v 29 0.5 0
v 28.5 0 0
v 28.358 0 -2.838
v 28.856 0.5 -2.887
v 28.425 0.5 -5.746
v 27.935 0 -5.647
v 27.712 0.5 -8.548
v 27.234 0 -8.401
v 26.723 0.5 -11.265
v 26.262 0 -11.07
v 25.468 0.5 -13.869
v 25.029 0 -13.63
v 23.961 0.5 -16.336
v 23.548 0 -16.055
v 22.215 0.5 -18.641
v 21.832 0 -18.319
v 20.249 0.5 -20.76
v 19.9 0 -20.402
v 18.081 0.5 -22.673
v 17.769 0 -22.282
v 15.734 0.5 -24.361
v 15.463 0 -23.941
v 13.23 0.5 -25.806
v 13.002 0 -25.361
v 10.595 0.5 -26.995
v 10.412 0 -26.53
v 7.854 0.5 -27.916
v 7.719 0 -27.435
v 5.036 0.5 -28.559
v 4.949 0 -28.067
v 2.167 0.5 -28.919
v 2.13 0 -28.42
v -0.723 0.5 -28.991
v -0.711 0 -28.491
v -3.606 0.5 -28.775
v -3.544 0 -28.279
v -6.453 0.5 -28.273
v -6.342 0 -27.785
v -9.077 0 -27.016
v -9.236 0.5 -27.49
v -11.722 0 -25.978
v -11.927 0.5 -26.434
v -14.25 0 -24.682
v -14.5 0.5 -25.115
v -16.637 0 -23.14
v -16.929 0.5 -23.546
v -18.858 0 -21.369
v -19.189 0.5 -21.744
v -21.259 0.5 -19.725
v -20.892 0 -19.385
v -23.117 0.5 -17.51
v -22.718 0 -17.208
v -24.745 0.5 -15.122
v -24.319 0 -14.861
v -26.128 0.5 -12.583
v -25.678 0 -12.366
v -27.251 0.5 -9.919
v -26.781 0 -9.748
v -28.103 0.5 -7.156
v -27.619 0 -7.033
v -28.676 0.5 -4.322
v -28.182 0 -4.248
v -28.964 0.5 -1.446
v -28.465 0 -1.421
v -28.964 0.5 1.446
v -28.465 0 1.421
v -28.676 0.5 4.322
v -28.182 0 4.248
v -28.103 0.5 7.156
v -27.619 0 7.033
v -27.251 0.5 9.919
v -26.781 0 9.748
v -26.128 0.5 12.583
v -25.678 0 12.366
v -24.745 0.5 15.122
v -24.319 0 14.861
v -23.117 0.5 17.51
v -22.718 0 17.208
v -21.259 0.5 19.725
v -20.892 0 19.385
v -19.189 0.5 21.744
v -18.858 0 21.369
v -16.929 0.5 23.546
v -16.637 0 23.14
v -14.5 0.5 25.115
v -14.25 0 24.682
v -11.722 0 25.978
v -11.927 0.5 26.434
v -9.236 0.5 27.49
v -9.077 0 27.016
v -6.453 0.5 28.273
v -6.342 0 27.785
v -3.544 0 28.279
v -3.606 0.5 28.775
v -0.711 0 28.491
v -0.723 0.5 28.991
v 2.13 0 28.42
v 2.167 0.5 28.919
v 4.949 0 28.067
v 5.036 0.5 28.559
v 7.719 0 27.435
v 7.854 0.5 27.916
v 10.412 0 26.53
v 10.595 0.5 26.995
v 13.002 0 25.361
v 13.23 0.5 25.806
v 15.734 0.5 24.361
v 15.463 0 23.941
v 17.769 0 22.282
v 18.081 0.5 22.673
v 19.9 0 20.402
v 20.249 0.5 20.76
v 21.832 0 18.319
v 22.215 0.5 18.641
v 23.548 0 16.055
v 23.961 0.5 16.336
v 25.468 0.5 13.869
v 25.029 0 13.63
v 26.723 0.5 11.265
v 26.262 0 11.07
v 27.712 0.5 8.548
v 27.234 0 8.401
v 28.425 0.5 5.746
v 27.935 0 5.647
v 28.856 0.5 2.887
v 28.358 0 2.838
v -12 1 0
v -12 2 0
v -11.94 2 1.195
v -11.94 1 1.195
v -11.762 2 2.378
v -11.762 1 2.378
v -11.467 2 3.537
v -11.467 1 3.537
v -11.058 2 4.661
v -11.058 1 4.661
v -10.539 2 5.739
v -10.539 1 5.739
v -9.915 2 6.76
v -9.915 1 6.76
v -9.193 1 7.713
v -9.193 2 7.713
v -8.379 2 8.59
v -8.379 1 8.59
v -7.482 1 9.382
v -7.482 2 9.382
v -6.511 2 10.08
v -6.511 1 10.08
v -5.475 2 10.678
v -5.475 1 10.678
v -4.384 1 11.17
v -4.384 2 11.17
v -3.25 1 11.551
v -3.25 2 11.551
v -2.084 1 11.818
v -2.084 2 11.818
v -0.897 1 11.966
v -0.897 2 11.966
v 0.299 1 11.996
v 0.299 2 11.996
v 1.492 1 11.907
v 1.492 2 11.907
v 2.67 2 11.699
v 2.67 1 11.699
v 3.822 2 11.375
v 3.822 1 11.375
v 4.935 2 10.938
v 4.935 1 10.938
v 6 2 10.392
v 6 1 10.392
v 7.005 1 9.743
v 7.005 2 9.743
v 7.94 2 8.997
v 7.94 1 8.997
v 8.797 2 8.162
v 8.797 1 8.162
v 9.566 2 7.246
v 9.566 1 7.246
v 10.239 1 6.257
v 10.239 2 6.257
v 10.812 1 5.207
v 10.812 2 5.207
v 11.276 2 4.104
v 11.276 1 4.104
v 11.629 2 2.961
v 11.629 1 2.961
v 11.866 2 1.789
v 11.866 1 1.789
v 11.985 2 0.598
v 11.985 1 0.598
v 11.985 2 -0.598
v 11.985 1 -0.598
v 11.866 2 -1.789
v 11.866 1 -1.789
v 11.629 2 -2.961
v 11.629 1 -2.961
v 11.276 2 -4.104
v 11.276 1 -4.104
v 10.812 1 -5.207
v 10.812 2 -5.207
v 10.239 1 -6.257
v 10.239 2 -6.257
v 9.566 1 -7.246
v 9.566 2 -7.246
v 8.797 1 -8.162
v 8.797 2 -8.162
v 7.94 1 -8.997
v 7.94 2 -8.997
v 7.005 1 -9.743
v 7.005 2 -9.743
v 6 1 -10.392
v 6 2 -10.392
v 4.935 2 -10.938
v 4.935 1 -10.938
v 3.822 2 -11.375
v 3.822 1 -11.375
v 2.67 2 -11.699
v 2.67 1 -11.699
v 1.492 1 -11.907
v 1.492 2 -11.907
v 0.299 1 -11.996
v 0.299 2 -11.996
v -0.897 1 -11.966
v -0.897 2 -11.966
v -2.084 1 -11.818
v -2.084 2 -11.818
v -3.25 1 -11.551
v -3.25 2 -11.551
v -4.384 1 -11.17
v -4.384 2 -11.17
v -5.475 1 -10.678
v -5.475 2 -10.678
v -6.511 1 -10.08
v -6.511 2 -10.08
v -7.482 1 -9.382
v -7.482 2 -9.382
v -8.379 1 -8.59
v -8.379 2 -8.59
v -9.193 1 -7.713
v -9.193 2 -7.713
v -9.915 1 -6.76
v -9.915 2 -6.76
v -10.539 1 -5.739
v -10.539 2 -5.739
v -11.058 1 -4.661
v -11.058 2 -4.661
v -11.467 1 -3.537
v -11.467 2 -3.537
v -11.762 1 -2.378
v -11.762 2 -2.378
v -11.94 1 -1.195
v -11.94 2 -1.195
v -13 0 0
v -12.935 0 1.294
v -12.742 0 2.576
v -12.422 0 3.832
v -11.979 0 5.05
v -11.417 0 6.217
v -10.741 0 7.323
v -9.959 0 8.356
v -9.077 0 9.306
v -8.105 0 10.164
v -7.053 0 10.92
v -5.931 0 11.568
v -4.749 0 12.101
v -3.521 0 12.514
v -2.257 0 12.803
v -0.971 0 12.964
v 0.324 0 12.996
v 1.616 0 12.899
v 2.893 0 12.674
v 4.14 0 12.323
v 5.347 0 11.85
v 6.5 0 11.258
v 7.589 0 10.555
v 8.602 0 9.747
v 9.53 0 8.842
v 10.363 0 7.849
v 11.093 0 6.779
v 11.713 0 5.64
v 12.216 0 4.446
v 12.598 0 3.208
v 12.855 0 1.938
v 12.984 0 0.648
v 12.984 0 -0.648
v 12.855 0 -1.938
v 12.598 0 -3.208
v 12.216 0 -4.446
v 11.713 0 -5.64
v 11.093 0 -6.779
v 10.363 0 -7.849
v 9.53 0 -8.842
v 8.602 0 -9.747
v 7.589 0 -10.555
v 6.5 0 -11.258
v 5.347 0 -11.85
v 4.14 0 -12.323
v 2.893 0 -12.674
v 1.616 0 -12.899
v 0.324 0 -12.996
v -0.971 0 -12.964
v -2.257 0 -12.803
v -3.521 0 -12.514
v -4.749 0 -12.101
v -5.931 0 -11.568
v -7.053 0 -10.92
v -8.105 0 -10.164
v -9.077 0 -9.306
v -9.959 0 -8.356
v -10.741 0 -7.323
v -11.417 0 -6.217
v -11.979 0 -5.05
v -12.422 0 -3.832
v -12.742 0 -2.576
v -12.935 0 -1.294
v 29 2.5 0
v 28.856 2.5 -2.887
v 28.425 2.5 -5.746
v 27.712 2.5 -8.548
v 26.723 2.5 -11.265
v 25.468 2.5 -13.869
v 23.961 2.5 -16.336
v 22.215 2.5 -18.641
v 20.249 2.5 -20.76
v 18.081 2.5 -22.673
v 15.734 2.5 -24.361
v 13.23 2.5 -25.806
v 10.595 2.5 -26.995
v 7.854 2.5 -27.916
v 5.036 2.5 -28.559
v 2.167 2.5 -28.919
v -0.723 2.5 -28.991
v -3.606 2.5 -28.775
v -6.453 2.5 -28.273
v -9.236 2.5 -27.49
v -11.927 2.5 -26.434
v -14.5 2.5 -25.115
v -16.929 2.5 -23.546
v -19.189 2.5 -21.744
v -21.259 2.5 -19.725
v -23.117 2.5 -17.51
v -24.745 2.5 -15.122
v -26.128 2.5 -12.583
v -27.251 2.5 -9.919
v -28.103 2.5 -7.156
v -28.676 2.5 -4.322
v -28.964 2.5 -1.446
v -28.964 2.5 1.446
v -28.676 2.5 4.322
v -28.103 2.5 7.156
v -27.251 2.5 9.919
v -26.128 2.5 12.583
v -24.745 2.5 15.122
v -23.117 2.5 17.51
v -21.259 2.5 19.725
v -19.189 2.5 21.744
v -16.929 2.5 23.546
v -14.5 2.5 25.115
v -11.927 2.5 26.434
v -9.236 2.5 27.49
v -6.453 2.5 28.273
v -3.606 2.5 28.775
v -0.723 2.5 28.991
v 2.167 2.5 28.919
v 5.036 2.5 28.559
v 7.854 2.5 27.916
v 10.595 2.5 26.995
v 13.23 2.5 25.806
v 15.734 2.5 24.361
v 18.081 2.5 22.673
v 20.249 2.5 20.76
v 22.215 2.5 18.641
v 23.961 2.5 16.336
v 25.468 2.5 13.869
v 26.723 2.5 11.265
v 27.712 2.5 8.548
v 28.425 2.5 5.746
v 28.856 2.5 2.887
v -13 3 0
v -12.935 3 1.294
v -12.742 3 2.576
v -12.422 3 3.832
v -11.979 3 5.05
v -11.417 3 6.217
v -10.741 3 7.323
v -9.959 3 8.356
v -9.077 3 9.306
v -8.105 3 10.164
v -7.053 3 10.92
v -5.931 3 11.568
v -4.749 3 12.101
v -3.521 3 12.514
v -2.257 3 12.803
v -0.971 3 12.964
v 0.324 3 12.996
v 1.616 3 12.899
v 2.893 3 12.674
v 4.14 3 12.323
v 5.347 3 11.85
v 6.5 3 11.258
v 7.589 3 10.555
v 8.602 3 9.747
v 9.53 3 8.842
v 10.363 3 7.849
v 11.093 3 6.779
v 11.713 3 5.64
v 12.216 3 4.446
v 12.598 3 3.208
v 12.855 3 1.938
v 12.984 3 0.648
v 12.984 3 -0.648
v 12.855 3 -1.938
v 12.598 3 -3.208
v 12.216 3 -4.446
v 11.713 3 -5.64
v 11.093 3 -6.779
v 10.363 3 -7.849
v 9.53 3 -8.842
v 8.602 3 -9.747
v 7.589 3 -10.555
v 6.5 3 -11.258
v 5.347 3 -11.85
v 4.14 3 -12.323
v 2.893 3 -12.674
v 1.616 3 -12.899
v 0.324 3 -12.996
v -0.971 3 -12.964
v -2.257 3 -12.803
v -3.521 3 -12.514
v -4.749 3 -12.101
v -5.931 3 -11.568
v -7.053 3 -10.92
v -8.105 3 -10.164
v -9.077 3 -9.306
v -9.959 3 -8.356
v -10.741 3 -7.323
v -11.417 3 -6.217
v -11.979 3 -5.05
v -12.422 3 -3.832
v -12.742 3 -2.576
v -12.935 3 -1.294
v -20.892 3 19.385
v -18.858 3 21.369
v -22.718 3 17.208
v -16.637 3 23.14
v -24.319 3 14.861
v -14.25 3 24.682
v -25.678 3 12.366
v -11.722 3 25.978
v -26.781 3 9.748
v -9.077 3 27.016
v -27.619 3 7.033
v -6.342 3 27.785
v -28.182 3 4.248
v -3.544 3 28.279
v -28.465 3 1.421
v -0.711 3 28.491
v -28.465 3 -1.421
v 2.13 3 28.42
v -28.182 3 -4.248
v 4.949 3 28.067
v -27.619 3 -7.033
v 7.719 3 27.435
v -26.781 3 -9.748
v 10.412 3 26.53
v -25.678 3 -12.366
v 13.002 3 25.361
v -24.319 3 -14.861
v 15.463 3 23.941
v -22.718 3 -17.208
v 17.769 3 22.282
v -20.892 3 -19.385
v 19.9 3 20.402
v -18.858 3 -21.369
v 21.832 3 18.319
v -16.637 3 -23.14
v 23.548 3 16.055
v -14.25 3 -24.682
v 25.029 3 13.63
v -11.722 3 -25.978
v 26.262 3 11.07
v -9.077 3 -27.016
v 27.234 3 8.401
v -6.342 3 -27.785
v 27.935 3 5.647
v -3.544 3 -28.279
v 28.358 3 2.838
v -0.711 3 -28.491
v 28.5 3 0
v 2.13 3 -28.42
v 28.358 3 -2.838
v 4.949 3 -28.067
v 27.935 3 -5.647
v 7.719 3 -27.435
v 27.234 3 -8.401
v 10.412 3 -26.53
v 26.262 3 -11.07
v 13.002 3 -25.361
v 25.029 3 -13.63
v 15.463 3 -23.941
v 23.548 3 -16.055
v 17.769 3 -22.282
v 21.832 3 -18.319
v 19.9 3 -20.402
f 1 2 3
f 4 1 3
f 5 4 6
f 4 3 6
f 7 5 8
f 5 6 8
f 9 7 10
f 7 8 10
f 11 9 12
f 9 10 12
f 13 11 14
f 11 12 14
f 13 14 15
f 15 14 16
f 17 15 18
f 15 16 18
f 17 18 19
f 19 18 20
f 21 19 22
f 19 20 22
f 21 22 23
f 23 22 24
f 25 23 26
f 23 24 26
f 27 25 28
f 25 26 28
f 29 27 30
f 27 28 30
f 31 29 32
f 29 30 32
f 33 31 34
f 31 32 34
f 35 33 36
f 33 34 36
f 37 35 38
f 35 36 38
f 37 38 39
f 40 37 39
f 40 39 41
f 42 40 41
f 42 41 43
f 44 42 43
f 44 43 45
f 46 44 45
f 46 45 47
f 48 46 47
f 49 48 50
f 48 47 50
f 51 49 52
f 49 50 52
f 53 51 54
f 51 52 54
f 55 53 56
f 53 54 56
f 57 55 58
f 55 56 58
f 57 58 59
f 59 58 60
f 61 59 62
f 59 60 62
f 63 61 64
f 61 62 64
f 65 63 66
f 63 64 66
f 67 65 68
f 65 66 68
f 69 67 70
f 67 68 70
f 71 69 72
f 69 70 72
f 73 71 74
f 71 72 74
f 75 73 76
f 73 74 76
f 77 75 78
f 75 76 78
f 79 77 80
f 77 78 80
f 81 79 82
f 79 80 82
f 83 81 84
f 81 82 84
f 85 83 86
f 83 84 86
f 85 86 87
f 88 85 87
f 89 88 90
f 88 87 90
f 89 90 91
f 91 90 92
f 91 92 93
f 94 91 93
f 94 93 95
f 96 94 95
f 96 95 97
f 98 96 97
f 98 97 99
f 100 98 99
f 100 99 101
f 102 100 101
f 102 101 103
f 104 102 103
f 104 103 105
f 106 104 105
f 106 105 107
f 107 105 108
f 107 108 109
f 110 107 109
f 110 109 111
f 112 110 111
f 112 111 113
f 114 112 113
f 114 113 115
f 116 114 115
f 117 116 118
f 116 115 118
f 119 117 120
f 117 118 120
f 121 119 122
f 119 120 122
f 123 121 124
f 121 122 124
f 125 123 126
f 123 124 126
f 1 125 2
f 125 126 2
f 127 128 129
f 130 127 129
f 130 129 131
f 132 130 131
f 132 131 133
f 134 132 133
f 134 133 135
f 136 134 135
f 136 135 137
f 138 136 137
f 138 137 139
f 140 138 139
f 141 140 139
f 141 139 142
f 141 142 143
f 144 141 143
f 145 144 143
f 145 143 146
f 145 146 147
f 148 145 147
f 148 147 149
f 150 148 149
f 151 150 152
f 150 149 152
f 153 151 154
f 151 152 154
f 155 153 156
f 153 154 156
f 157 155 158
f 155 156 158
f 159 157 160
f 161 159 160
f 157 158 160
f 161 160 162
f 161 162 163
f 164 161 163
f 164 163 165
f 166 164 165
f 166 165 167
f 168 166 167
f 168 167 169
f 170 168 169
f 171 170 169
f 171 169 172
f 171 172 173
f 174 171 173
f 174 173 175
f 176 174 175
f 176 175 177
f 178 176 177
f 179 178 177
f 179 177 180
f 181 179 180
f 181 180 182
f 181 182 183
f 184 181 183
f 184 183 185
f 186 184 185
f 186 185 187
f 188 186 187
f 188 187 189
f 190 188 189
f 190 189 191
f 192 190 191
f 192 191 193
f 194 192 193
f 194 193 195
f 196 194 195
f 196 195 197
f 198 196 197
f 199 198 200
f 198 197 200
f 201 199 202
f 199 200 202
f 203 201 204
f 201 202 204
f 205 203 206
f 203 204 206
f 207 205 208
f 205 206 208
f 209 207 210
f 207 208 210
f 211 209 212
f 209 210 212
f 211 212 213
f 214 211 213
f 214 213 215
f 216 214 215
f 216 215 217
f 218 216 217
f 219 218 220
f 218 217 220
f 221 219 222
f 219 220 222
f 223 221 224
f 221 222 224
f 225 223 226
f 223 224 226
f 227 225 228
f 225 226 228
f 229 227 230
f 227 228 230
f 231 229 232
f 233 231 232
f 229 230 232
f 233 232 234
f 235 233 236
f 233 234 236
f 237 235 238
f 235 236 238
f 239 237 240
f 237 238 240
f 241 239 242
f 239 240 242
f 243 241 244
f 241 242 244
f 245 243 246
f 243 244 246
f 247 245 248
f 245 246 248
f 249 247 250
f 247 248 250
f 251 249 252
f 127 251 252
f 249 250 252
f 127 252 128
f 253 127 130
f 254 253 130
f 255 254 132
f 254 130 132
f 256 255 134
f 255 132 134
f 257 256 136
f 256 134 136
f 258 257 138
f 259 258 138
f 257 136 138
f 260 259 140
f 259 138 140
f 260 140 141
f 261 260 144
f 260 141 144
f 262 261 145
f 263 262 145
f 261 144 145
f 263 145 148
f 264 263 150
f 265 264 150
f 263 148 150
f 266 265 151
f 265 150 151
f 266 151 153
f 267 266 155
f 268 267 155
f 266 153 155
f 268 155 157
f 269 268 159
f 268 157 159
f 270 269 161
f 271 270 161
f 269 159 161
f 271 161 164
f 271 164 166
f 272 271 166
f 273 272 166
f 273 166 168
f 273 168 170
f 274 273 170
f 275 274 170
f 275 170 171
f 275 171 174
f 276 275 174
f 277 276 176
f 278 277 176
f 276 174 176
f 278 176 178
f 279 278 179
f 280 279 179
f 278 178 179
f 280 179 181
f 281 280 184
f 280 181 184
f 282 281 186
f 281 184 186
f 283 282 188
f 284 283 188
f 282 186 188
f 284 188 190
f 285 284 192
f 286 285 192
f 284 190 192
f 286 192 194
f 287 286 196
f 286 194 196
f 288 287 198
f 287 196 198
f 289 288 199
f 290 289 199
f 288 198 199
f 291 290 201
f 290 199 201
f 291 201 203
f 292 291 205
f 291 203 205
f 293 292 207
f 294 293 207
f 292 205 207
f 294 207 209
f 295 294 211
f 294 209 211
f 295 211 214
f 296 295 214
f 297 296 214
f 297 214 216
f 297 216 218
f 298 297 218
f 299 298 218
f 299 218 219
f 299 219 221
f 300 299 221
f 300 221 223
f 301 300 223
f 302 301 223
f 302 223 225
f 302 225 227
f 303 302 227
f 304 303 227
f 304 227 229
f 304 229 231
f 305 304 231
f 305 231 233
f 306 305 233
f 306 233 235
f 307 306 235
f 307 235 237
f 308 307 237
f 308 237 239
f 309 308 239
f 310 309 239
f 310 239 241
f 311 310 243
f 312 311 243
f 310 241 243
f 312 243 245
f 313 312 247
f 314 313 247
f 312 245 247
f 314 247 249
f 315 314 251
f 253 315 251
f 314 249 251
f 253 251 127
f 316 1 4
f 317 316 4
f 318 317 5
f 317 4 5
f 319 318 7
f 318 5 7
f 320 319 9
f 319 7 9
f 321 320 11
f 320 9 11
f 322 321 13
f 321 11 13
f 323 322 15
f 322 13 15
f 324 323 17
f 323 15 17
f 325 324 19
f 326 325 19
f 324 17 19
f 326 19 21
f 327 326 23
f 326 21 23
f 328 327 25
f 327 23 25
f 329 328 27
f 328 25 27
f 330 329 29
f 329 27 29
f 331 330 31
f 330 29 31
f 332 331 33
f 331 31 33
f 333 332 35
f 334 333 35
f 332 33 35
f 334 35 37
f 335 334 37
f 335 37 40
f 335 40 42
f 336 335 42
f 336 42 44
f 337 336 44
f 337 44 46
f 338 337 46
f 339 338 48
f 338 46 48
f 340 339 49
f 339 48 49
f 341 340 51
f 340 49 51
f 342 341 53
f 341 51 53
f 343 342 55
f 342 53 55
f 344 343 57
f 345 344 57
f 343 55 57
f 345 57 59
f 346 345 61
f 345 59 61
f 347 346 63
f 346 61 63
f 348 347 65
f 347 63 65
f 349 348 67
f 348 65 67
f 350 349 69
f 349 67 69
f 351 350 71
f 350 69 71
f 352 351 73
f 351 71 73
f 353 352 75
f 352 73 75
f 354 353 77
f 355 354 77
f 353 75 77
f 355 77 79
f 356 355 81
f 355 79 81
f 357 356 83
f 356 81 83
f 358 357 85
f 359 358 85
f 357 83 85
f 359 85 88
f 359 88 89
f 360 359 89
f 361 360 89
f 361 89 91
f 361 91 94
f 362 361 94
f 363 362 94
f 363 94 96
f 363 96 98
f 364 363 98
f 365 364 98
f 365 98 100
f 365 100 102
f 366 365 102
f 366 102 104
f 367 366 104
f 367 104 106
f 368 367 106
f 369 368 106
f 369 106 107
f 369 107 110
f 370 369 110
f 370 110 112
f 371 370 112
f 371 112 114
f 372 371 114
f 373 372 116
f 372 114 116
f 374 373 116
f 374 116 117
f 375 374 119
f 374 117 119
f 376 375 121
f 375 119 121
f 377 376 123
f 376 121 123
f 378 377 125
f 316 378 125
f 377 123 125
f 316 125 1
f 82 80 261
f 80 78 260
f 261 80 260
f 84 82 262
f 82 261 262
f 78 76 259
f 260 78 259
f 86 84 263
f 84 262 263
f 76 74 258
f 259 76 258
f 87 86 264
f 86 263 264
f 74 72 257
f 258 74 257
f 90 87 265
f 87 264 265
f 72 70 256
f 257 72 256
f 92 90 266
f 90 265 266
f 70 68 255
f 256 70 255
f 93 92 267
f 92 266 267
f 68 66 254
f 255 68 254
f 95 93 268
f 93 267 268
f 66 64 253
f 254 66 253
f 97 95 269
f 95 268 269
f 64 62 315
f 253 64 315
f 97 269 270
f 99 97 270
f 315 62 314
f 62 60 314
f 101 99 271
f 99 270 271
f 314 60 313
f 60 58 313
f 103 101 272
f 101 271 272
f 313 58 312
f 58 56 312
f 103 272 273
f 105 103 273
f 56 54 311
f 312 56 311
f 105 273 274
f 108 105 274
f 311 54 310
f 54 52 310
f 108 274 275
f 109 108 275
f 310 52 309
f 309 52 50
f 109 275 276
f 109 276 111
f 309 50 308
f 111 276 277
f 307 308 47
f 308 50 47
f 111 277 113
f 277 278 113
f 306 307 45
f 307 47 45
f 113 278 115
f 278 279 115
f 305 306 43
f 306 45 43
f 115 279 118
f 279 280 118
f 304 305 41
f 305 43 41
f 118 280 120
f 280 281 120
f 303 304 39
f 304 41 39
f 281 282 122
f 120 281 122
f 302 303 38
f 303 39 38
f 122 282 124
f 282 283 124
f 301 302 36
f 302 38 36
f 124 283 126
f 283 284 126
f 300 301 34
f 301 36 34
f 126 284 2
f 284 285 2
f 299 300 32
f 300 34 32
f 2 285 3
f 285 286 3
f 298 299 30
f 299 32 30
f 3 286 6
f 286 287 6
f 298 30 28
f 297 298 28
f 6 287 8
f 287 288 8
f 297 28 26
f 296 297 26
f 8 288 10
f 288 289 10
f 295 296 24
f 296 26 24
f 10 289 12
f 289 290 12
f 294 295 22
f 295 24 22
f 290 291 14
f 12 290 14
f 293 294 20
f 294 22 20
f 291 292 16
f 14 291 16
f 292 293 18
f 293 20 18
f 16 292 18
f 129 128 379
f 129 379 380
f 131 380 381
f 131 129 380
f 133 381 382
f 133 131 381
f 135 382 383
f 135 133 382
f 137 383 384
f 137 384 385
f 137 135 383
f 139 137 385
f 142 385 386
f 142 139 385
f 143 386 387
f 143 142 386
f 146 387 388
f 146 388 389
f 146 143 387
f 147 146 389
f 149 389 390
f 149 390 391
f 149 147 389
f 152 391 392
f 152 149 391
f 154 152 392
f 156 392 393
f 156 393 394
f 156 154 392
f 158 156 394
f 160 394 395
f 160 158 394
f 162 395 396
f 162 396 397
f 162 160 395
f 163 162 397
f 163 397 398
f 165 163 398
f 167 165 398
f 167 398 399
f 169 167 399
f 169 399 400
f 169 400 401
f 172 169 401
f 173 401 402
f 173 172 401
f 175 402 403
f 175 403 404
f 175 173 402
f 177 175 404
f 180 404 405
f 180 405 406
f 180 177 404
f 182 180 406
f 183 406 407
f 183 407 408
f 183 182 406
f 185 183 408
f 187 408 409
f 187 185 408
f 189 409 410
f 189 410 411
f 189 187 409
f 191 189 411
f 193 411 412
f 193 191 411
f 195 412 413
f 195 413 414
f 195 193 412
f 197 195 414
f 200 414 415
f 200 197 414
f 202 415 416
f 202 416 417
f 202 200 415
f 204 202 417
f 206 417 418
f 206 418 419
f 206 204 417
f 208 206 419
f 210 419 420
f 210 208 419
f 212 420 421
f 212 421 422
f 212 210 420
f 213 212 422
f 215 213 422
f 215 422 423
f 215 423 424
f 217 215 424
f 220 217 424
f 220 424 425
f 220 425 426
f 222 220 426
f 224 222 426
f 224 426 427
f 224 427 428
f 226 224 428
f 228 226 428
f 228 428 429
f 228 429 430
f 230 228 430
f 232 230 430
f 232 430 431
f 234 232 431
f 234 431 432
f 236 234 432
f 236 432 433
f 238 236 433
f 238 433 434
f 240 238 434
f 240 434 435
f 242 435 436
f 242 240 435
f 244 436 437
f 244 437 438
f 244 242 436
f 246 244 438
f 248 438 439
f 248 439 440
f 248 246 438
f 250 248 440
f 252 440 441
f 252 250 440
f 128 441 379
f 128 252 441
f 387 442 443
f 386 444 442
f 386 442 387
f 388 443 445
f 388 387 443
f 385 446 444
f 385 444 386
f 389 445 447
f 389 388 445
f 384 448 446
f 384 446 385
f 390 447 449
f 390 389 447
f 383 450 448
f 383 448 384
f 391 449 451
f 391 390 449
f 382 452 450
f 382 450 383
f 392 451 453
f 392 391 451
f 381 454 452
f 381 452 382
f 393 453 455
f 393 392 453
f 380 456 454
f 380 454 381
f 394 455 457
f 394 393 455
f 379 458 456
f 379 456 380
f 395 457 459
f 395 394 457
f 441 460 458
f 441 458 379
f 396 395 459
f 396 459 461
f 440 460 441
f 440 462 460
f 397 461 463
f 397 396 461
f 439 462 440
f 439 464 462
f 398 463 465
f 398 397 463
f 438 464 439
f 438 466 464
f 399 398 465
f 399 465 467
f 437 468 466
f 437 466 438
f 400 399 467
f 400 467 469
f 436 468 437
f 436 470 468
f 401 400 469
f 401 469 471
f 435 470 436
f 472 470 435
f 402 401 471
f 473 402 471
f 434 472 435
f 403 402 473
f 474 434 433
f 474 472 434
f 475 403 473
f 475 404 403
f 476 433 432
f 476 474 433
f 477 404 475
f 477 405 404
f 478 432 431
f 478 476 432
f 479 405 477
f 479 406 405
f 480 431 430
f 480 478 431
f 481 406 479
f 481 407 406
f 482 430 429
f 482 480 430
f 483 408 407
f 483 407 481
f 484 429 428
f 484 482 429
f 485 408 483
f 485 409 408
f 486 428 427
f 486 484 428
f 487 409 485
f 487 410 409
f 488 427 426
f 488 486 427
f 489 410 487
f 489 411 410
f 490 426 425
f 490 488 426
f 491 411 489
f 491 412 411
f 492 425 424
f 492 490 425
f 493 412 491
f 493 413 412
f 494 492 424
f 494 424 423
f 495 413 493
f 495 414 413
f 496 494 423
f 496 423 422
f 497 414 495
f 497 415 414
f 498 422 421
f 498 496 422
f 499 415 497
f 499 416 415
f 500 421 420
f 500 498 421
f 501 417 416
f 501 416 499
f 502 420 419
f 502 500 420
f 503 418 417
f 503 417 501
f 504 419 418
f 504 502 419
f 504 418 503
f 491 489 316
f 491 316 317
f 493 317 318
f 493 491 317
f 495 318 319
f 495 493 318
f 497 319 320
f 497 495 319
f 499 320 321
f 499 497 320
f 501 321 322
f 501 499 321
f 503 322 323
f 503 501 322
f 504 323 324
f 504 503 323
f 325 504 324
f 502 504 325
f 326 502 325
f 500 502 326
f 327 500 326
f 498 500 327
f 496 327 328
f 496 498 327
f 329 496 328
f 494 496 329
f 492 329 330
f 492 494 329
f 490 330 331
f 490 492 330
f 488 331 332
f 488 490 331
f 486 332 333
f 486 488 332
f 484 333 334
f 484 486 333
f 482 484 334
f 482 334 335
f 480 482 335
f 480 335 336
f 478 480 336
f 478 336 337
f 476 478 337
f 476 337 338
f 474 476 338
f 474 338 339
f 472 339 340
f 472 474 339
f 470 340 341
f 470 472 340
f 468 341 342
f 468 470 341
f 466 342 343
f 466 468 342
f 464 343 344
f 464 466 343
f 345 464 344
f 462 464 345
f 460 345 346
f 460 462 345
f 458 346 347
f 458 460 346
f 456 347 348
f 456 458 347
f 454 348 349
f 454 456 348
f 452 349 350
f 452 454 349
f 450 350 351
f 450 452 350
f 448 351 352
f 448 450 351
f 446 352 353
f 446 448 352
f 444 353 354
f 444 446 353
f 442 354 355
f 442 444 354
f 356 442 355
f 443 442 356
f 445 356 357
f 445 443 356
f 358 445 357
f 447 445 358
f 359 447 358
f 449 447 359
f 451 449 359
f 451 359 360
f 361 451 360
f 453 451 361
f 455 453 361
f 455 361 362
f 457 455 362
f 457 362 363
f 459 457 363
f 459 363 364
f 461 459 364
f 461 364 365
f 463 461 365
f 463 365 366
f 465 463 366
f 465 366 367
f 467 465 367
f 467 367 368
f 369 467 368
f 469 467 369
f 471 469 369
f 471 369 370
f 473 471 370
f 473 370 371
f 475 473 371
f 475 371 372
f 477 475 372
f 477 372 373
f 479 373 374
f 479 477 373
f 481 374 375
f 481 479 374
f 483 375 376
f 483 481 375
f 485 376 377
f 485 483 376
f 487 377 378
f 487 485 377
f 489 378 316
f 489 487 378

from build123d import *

# Parameters (mm, degrees)
SKETCH1_R          = 29
EXTRUDE1_DEPTH     = 3
SKETCH2_R          = 12
CUT_EXTRUDE1_DEPTH = 4
CHAMFER1_SIZE      = 0.5
CHAMFER2_SIZE      = 1


with BuildPart() as part:
    # Sketch1 → Extrude1 (new body)
    with BuildSketch(Plane(origin=(0, 0, 0), x_dir=(1, 0, 0), z_dir=(0, 1, 0))):
        Circle(SKETCH1_R)
    extrude(amount=EXTRUDE1_DEPTH)

    # Sketch2 → Cut-Extrude1 (cut, through all)
    with BuildSketch(Plane(origin=(0, 3, 0), x_dir=(-1, 0, 0), z_dir=(0, 1, 0))):
        Circle(SKETCH2_R)
    extrude(amount=-CUT_EXTRUDE1_DEPTH, mode=Mode.SUBTRACT)

    # Chamfer1
    chamfer1_edges = [part.edges().sort_by_distance(p)[0] for p in [
        (-29, 0, 0),
        (-29, 3, 0),
    ]]
    chamfer(chamfer1_edges, length=CHAMFER1_SIZE)

    # Chamfer2
    chamfer2_edges = [part.edges().sort_by_distance(p)[0] for p in [
        (12, 0, 0),
        (12, 3, 0),
    ]]
    chamfer(chamfer2_edges, length=CHAMFER2_SIZE)


solid = part.part
